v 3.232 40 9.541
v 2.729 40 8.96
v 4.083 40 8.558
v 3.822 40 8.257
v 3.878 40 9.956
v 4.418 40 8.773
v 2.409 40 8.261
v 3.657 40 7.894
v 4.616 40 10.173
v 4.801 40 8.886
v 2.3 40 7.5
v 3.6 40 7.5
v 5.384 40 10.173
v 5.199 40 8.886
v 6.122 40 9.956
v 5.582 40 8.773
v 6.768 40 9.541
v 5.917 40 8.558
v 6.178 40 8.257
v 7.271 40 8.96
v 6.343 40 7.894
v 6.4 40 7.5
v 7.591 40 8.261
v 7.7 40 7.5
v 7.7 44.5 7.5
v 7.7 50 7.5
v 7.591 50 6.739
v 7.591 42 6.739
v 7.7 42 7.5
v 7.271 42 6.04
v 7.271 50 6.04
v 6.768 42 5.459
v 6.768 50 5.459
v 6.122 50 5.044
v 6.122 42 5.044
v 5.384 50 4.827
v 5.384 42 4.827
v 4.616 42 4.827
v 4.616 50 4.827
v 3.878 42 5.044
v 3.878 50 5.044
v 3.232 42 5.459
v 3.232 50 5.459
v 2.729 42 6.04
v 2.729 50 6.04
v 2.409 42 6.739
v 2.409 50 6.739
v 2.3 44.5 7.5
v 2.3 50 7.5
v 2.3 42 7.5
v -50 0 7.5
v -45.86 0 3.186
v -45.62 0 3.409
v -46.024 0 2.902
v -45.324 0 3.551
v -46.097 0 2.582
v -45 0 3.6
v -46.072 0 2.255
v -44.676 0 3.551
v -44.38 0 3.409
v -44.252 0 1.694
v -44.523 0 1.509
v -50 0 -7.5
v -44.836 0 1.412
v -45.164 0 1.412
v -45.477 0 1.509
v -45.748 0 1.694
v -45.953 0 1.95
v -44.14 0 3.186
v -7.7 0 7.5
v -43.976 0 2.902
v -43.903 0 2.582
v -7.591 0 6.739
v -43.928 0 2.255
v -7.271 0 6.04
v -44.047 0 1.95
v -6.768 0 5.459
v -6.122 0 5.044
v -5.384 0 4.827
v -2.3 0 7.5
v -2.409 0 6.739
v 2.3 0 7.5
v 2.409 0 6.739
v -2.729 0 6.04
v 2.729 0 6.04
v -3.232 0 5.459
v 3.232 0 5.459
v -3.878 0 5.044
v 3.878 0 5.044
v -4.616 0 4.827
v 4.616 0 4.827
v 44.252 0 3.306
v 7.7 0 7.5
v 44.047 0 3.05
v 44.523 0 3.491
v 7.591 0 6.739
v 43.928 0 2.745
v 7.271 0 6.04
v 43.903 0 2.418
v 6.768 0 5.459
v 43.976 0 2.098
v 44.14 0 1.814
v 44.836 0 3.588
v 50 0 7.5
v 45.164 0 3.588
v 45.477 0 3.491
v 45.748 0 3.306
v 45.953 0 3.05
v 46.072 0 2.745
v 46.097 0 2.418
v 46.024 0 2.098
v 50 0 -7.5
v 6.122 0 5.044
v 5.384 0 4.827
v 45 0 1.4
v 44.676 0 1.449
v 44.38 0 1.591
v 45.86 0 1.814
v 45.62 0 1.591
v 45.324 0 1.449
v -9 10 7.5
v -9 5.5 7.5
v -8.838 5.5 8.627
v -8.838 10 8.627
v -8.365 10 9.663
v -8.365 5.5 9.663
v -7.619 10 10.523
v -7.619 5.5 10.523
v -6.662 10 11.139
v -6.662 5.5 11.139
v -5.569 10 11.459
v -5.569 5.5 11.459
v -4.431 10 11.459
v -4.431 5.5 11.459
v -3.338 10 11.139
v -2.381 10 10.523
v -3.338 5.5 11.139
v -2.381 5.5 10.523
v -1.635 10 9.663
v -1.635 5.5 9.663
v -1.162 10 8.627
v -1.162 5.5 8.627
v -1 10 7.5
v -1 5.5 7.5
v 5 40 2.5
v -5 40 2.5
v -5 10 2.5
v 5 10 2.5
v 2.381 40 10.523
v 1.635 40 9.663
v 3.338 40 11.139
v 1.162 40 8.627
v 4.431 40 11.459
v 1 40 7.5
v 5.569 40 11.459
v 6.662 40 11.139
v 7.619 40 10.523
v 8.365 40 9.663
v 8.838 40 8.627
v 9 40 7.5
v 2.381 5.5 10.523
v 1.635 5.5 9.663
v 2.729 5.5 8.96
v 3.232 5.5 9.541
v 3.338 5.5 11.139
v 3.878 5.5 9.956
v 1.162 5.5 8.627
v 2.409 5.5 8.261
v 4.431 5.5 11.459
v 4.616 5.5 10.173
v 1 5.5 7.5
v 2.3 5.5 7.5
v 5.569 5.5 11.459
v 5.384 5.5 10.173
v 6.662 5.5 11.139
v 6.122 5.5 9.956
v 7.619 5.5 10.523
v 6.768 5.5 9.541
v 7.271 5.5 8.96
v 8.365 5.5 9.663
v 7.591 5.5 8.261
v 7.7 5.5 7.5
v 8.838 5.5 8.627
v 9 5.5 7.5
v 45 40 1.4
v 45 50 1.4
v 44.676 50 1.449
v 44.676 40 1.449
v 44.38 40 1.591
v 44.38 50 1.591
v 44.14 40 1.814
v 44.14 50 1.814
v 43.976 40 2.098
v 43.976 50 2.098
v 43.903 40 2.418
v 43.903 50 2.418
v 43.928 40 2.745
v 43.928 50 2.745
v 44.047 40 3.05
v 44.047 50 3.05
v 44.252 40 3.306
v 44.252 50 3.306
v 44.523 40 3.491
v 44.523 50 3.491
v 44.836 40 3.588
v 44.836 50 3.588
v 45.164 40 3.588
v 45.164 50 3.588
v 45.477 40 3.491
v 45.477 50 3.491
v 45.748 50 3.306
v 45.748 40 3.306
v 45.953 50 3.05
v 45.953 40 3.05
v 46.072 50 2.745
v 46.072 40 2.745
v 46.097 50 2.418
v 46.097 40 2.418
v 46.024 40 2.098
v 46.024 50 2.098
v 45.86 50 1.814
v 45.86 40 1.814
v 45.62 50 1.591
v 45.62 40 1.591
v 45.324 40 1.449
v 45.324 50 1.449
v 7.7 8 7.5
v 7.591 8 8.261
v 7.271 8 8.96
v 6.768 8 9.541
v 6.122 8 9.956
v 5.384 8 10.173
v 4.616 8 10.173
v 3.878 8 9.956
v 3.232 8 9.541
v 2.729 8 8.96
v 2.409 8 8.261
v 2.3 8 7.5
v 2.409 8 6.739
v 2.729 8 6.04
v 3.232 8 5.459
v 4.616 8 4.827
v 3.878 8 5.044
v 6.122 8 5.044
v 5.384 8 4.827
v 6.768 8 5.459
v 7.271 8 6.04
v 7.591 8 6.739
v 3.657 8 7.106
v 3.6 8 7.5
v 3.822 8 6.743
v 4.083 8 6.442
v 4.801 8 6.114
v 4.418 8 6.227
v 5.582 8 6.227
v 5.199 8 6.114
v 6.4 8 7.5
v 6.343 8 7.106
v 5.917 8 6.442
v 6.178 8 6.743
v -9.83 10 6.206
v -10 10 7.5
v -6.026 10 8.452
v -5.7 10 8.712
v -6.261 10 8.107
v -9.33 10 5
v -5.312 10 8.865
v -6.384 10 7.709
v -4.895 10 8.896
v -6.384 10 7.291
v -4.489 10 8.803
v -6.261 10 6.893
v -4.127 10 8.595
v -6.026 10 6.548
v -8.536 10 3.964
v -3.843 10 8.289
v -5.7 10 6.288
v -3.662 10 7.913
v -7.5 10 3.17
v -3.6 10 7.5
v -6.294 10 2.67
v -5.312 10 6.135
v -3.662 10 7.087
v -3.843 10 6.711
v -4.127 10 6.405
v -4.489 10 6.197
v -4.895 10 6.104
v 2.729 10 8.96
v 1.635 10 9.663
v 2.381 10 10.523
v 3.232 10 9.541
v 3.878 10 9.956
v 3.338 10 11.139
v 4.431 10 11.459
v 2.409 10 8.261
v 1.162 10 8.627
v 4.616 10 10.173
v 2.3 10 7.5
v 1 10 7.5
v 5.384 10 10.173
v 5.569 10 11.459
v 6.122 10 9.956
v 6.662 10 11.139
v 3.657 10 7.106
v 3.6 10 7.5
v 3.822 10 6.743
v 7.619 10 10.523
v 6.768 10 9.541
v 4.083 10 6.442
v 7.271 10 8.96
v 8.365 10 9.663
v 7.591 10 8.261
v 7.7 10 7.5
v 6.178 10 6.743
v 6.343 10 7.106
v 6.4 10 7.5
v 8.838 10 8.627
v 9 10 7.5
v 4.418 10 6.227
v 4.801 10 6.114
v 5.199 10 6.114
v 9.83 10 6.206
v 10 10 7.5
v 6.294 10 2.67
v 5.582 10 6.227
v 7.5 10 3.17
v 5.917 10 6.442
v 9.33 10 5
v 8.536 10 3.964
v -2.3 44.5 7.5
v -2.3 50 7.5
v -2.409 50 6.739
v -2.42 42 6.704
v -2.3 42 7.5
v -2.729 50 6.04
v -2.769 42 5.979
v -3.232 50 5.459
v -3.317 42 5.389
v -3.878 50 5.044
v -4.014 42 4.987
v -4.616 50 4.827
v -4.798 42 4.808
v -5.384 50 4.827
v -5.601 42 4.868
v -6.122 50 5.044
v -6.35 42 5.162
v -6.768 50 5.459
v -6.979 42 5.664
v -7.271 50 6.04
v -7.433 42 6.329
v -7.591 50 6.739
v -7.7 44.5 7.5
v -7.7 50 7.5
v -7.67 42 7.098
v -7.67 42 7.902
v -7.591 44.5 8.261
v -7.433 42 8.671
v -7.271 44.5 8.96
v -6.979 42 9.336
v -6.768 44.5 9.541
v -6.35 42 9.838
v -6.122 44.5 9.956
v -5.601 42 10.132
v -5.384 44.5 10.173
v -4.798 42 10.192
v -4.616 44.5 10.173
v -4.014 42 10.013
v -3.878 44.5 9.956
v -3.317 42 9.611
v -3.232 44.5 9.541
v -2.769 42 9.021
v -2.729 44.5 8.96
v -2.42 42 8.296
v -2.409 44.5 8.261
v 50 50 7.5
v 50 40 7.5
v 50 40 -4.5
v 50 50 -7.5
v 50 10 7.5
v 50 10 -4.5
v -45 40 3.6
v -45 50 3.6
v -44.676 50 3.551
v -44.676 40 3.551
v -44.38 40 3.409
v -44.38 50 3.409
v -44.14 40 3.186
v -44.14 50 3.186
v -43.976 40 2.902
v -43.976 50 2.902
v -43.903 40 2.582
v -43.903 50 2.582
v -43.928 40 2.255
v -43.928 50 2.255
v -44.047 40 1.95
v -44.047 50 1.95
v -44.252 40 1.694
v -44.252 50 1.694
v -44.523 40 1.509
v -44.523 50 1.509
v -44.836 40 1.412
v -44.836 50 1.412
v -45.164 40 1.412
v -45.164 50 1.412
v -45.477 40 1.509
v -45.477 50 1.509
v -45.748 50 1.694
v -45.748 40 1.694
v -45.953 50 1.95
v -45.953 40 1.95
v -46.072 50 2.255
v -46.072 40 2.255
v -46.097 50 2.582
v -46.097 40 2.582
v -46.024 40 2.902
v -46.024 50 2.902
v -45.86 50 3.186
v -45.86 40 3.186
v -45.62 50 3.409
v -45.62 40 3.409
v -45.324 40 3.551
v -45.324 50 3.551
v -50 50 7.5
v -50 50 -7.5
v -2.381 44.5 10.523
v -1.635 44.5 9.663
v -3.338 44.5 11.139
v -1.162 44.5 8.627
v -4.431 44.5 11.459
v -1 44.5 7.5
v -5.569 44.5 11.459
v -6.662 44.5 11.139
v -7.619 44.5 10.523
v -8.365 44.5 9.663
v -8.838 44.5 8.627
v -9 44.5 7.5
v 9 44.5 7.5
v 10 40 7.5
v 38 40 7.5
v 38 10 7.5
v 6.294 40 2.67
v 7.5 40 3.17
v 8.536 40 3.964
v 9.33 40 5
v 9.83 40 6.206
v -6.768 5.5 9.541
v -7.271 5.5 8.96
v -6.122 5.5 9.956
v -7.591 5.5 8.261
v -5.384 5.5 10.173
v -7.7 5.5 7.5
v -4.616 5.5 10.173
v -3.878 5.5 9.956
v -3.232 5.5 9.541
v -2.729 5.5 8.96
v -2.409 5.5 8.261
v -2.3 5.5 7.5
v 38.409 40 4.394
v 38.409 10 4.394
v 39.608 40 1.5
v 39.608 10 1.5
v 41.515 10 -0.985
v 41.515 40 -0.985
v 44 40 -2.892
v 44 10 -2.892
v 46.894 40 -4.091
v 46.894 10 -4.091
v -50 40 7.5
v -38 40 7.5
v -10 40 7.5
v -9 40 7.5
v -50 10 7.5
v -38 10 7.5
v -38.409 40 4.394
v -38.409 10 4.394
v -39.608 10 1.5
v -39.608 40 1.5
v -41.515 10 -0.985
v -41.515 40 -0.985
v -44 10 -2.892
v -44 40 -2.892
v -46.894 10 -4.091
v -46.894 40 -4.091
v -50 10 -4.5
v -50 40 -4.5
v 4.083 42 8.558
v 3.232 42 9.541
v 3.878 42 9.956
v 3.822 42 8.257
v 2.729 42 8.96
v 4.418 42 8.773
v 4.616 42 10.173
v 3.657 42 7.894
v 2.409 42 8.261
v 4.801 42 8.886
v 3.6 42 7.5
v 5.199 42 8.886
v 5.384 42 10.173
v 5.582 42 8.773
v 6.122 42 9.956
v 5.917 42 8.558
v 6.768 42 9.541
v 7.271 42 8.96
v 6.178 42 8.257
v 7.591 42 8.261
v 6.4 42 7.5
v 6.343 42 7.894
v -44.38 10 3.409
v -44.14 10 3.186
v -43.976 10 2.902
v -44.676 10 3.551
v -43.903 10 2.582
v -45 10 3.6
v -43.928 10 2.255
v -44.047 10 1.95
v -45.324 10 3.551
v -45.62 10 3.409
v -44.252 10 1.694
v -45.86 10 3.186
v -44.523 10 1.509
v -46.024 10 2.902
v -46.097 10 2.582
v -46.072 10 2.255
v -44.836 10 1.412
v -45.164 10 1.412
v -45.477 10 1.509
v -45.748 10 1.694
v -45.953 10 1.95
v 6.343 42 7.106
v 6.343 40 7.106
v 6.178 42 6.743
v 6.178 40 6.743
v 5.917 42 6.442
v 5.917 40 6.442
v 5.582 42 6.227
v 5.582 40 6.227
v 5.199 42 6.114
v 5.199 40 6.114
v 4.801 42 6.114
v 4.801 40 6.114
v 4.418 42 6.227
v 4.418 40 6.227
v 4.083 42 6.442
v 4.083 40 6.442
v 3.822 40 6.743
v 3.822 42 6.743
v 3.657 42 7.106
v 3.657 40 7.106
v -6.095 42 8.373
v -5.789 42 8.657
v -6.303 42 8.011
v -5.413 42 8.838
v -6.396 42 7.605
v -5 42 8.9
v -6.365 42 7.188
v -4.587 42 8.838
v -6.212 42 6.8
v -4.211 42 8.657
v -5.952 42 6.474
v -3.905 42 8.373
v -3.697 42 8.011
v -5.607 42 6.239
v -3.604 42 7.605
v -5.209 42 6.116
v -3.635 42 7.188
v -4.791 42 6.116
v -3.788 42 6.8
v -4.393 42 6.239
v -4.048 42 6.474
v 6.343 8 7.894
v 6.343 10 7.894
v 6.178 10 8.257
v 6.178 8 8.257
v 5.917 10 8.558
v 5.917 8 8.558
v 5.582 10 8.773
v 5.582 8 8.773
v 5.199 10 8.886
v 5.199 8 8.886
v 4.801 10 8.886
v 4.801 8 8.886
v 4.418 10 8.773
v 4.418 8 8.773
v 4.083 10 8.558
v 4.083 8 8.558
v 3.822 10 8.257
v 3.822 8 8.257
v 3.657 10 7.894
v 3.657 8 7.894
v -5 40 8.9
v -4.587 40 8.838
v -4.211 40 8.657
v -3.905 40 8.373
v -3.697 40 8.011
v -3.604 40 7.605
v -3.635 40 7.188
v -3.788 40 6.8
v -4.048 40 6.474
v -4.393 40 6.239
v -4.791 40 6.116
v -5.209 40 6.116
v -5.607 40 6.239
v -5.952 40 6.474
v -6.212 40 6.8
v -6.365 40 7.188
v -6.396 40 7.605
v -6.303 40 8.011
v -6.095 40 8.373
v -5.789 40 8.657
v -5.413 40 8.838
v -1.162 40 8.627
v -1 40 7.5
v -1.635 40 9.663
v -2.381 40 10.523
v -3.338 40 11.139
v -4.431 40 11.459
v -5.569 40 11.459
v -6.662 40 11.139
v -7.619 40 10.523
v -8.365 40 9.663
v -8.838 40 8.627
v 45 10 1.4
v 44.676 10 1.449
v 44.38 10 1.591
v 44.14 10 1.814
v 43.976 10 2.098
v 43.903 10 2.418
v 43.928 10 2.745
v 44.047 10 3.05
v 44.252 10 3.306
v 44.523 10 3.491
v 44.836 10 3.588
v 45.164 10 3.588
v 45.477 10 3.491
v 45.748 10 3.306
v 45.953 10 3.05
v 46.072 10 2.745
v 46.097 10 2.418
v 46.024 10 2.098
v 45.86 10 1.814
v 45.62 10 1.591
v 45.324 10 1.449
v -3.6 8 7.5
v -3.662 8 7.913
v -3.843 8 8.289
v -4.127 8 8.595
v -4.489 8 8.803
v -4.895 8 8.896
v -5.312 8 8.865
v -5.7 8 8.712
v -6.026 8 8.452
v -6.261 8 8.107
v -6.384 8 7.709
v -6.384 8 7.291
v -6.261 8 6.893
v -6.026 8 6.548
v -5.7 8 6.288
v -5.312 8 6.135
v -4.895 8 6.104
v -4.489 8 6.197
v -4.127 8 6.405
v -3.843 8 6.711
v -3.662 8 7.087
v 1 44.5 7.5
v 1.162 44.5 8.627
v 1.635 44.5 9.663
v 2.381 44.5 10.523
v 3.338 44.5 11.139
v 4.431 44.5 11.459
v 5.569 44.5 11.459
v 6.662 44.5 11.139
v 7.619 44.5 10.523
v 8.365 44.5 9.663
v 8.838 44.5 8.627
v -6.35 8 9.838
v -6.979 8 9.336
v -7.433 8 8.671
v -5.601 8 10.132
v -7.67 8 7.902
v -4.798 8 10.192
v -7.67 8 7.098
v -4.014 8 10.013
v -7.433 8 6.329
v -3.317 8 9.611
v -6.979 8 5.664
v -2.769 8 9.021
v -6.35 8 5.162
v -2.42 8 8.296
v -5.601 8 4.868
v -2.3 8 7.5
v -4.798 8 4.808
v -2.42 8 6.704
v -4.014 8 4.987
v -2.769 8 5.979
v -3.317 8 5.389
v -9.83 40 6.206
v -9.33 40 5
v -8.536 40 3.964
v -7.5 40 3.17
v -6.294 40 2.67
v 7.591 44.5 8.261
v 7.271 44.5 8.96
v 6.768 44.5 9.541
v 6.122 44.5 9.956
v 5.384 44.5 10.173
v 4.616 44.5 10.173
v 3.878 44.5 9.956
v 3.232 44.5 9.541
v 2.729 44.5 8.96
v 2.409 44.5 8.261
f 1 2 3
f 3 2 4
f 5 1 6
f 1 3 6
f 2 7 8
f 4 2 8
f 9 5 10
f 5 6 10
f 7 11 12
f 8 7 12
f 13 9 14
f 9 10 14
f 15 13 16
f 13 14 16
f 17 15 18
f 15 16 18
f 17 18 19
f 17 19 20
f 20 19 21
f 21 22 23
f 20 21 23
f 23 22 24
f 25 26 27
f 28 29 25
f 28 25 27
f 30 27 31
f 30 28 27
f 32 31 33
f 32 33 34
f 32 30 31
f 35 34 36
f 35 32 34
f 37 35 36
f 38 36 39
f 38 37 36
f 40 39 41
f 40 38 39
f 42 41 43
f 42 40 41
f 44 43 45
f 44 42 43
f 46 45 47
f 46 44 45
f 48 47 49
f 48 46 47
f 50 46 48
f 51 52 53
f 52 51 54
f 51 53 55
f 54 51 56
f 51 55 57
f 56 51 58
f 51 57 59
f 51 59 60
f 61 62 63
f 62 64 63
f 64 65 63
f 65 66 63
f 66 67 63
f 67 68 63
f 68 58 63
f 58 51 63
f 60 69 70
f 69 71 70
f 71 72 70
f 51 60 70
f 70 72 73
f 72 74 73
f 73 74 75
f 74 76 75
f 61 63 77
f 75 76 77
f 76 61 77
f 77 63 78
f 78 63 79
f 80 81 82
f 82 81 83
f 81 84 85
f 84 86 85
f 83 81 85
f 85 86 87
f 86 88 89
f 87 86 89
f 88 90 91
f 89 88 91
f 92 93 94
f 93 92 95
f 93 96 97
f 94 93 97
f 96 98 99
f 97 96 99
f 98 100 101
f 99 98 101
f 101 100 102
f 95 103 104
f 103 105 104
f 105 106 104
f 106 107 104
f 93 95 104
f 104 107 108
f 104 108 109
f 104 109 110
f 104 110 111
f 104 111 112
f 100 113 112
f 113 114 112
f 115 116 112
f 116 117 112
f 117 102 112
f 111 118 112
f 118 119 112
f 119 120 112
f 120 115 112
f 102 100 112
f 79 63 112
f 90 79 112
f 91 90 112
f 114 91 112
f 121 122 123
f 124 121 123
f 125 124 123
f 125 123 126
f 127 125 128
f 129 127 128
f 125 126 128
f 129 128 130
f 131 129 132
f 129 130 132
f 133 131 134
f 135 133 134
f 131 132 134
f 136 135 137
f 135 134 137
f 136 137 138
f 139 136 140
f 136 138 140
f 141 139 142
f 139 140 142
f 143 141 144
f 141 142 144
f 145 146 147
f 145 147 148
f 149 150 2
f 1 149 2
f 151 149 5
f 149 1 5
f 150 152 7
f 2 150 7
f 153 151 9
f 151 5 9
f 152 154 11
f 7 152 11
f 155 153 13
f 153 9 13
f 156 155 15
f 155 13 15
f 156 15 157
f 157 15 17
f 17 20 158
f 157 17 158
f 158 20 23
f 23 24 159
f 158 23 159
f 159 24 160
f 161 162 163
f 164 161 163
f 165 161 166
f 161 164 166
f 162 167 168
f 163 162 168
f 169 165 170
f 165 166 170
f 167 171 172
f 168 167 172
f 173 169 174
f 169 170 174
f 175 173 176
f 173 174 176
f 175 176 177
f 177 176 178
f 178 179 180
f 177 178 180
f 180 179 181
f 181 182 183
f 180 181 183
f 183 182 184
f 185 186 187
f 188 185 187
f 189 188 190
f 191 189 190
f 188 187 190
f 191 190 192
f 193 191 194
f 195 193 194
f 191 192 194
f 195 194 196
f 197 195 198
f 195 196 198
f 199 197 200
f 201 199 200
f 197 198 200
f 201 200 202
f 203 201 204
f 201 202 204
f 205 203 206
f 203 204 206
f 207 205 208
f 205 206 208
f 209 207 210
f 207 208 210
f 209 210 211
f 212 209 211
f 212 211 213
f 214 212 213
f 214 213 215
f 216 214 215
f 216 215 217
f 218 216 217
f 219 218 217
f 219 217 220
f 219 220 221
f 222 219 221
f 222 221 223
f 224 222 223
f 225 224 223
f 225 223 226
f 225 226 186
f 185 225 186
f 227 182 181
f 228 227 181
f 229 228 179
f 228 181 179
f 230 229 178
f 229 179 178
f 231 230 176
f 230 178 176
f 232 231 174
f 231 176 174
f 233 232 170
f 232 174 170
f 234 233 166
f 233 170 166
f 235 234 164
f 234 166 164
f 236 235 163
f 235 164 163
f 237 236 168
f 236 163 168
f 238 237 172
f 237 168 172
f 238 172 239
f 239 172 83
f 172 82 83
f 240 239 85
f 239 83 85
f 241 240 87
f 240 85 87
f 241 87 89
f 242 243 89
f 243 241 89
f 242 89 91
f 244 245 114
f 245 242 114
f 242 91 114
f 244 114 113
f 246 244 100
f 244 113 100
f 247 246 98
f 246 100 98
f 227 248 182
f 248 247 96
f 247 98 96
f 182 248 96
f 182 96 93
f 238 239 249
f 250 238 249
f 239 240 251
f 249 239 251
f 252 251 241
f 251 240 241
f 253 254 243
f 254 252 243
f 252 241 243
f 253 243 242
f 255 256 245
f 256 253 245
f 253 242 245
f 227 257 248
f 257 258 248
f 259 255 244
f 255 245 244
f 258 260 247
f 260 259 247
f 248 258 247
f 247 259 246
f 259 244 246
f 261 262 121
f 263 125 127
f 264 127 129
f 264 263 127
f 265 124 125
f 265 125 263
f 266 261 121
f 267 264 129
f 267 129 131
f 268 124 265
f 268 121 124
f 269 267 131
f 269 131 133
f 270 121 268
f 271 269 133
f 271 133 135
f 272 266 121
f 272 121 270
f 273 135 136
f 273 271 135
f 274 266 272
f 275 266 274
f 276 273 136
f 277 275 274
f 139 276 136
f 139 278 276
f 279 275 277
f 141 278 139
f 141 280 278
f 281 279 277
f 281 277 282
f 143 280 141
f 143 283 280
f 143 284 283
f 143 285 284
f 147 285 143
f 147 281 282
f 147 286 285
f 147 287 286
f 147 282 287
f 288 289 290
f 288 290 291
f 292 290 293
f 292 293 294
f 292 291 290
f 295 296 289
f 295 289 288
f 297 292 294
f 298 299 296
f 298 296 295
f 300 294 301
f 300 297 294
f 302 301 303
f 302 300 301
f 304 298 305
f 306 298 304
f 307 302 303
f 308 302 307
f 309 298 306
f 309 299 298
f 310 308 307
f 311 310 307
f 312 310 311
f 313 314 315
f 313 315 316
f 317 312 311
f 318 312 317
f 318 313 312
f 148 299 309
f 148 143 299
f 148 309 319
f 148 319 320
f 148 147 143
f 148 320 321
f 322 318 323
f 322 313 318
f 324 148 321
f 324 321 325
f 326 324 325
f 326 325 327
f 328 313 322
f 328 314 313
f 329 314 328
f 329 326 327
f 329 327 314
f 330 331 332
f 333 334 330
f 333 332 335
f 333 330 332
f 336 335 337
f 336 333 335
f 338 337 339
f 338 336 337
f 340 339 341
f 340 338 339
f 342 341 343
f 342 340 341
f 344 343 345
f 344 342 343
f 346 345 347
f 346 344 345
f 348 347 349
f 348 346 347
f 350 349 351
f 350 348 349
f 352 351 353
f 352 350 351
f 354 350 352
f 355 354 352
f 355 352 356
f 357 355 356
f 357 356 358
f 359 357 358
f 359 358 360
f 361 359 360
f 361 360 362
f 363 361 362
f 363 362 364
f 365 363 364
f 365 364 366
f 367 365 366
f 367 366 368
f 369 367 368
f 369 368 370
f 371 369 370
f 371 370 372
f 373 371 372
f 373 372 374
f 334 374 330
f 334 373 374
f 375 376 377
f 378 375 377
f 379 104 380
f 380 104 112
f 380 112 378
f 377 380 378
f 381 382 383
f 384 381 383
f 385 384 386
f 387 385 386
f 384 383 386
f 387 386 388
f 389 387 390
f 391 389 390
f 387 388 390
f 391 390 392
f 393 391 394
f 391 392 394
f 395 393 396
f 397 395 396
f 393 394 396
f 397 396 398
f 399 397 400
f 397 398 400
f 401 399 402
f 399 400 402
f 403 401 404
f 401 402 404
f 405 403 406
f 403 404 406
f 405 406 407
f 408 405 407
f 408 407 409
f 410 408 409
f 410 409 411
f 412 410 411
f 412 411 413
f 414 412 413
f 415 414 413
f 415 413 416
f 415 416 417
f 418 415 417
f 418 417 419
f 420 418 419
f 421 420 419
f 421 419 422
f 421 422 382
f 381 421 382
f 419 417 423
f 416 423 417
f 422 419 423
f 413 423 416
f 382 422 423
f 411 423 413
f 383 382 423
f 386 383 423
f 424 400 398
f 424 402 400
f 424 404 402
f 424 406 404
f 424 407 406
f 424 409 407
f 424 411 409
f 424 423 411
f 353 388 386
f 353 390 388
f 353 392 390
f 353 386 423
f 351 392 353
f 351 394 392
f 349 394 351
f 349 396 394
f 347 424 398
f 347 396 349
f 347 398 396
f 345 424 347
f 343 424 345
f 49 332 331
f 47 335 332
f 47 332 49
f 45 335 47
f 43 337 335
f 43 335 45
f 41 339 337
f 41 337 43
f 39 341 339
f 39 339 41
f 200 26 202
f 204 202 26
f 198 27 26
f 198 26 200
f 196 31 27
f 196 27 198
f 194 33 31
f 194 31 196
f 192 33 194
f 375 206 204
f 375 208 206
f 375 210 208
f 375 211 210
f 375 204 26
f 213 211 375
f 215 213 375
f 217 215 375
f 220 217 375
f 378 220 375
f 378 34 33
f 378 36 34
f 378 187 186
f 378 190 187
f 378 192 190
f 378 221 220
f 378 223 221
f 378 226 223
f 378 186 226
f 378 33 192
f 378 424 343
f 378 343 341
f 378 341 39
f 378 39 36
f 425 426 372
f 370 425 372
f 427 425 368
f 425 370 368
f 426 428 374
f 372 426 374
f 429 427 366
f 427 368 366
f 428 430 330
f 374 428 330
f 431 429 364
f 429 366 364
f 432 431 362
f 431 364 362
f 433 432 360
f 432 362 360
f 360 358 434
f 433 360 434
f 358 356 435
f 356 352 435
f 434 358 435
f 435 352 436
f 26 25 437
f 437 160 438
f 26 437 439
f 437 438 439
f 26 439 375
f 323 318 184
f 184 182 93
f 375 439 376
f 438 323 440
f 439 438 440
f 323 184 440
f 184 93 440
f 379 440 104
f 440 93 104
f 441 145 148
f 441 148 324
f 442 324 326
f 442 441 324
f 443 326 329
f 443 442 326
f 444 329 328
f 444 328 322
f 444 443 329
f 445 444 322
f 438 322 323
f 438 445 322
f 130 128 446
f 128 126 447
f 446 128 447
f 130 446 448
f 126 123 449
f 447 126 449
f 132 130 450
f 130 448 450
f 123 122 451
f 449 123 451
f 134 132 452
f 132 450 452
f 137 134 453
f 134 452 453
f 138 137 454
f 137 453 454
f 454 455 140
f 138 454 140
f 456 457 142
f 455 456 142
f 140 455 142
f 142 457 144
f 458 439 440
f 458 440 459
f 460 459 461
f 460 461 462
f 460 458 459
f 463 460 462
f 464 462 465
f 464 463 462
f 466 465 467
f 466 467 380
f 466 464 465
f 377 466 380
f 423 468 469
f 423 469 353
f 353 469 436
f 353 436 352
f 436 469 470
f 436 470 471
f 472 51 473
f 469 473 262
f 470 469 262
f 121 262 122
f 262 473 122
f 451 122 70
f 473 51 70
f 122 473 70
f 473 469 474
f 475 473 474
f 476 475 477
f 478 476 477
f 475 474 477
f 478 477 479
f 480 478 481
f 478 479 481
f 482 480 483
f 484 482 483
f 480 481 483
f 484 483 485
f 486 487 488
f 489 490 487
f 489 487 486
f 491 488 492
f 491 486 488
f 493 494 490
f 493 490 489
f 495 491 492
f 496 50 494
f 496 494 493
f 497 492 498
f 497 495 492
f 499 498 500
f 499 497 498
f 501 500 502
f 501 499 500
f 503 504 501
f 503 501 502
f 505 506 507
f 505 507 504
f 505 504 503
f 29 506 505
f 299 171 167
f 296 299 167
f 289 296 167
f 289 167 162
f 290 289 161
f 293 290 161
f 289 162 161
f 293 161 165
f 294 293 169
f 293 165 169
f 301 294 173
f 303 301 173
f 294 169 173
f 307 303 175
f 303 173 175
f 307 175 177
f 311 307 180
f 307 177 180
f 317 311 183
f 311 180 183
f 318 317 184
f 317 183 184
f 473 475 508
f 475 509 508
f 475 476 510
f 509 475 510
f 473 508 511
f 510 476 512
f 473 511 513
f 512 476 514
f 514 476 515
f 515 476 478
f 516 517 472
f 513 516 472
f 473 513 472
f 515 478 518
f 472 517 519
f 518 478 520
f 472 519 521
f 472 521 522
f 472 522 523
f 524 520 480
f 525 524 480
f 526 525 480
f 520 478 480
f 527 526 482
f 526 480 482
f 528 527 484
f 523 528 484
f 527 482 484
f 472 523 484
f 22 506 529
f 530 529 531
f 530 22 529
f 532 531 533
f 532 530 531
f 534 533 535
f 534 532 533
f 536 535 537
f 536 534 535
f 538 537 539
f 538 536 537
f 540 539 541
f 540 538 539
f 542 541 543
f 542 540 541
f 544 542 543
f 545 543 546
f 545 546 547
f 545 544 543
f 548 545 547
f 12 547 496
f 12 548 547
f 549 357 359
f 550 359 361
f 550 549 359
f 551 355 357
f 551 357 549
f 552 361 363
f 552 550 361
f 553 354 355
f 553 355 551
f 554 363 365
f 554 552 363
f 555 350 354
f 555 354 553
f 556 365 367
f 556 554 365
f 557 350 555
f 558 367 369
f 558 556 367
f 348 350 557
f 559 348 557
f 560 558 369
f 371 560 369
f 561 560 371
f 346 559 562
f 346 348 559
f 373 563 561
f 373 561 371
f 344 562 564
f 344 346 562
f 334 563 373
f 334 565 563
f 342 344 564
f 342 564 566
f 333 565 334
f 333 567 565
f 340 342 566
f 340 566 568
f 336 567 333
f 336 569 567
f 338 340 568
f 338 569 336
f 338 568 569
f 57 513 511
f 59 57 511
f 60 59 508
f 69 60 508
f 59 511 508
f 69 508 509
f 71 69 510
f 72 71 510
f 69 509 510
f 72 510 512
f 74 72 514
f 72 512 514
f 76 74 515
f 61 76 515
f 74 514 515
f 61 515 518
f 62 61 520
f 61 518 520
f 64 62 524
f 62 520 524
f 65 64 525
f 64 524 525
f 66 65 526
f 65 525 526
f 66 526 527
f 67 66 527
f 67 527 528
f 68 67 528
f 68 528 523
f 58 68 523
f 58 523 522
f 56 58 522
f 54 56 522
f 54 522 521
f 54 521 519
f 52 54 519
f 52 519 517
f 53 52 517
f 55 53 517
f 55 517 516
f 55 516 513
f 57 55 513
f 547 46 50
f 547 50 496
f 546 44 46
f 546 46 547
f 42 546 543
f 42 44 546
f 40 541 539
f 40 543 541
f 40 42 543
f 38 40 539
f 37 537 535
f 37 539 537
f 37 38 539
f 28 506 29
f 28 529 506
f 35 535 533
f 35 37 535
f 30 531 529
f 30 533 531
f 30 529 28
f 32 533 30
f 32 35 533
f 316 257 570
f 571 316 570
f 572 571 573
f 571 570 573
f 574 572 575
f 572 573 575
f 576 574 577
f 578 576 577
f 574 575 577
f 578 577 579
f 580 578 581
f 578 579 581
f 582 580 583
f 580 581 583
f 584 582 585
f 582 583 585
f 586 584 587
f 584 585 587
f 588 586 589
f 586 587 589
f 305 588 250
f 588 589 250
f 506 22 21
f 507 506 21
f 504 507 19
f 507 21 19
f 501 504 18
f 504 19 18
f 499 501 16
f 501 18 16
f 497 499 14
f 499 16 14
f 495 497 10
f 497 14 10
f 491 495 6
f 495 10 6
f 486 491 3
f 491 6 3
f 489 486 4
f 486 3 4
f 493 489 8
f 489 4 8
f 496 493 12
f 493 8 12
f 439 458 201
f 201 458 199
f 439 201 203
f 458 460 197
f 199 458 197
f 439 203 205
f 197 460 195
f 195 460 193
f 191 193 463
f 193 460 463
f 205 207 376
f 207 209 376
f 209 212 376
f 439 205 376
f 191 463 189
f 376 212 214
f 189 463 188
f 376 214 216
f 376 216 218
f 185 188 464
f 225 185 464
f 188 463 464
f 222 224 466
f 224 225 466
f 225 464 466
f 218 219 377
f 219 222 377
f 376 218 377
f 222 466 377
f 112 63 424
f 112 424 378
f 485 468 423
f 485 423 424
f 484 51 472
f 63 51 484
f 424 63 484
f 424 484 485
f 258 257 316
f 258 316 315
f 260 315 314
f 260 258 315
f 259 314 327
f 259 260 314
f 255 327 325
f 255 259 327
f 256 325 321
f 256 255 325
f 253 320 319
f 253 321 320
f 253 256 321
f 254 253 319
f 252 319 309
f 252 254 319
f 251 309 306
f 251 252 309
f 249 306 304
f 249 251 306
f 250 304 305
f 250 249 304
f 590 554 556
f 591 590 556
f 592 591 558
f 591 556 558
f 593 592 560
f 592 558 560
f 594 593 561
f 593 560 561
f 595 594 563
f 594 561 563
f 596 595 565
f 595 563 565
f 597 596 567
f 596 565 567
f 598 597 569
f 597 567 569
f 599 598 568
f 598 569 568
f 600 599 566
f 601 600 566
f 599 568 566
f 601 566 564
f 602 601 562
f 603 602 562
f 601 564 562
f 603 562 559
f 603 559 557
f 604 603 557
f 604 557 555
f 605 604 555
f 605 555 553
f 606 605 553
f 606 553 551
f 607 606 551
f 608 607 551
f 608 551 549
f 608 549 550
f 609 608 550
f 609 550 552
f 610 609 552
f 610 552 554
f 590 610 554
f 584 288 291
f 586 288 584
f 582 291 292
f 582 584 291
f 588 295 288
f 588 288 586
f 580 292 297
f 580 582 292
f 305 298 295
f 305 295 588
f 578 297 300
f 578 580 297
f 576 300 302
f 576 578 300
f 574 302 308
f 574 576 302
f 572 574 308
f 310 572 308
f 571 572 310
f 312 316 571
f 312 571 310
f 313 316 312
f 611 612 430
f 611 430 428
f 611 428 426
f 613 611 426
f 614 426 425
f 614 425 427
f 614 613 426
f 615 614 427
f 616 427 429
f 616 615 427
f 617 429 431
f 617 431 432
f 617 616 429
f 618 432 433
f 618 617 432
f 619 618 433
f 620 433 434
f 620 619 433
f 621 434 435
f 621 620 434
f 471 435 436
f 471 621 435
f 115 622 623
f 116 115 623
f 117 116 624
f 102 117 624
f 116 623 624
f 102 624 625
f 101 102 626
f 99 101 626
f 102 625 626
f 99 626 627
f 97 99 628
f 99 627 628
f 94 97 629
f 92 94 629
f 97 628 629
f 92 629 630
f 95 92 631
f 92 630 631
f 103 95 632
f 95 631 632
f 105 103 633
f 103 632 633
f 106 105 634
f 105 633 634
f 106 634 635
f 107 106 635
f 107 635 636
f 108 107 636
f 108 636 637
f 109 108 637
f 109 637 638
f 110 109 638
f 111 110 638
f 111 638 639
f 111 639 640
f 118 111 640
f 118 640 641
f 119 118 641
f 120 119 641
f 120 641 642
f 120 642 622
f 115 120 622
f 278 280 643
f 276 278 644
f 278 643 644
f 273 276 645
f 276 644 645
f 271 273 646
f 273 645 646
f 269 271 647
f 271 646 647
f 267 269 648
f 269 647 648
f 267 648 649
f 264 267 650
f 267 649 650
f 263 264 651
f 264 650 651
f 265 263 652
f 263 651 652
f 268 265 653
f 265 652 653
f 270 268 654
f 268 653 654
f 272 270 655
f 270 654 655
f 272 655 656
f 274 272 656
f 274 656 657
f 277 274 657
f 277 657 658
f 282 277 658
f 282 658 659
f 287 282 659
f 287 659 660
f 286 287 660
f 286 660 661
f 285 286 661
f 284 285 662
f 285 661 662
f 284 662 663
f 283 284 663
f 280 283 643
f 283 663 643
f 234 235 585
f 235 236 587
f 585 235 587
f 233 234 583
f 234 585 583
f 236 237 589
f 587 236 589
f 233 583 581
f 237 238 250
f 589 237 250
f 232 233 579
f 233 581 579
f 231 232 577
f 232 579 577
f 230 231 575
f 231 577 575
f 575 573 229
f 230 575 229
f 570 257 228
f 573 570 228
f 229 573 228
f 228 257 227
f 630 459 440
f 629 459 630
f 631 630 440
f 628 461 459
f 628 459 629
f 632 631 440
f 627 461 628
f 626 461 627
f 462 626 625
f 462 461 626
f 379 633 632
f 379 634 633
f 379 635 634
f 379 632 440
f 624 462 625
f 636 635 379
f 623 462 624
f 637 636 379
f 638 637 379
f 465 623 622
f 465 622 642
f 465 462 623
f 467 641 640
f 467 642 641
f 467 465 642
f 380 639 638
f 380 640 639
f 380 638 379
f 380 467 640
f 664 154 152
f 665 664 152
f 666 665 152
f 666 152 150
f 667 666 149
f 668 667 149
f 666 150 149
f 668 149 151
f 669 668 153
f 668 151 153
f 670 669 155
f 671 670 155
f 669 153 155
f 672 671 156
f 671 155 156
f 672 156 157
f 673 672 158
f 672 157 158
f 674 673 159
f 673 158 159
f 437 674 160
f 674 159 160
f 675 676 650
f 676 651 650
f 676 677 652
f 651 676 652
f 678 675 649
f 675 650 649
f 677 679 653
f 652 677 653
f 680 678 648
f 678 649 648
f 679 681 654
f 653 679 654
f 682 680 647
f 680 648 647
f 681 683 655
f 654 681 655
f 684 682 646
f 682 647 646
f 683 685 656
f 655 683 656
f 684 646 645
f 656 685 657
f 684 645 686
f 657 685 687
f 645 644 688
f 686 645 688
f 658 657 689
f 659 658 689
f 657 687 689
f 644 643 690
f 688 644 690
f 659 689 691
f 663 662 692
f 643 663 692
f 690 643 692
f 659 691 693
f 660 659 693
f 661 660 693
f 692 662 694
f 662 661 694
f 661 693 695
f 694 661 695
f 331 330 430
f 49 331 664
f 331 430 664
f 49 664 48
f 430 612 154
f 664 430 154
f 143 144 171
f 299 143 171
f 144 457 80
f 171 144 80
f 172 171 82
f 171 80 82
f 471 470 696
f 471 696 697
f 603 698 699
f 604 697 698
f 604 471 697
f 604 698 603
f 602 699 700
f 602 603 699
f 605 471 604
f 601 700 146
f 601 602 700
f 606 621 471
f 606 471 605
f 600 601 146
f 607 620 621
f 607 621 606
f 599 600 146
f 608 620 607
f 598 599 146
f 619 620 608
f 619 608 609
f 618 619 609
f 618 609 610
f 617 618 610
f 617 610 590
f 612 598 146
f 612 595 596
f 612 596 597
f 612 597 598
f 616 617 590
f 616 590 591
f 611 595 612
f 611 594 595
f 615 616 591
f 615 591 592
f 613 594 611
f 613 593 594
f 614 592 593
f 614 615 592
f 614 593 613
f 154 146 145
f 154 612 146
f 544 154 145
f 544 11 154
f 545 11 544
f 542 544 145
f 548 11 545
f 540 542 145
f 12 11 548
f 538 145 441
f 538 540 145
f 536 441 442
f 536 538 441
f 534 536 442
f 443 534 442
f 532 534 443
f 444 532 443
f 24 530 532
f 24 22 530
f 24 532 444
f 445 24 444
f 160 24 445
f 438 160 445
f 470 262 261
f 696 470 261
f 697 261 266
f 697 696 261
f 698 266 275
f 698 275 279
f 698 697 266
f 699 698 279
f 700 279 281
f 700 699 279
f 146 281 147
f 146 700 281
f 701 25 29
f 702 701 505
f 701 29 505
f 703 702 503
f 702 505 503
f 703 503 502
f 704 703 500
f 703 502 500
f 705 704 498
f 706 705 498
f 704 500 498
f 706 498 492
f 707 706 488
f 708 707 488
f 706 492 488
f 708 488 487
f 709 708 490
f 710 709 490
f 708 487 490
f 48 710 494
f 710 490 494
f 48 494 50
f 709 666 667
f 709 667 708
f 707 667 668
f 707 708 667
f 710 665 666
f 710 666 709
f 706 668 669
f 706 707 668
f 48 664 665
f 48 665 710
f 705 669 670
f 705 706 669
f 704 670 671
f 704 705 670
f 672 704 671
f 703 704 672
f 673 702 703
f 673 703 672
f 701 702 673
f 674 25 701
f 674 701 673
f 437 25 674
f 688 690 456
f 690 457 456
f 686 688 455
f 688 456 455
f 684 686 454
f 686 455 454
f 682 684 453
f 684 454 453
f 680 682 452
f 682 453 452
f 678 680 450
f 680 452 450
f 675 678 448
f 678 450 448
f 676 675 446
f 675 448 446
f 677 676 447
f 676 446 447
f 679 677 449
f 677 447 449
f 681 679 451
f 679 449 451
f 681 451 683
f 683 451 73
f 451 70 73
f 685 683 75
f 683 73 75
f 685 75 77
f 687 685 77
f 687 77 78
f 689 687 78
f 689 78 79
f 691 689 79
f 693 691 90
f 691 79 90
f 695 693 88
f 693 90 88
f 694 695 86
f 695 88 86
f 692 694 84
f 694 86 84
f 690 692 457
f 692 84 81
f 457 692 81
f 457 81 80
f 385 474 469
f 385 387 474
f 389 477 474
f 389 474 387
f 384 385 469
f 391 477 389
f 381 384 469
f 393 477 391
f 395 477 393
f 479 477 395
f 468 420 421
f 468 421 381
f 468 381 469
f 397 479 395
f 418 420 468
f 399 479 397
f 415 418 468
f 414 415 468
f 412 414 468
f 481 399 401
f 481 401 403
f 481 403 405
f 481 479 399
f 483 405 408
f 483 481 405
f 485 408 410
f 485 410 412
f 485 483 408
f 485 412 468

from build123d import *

# Parameters (mm, degrees)
SKETCH_1_W               = 100
SKETCH_1_H               = 15
EXTRUDE_1_DEPTH          = 50
SKETCH_2_R               = 1.1
CUT_EXTRUDE_1_DEPTH      = 72.107313267
SKETCH_3_W               = 12
SKETCH_3_H               = 30
CUT_EXTRUDE_5_DEPTH      = 15
CUT_EXTRUDE_5_DEPTH_BACK = 15
EXTRUDE_2_DEPTH          = 4.5
CUT_EXTRUDE_START        = -2.5
SKETCH_5_R               = 2.7
CUT_EXTRUDE_2_DEPTH      = 12.5
SKETCH_6_R               = 1.4
CUT_EXTRUDE_4_DEPTH      = 67.304223093
MIRROR_4_COPY_1_DEPTH    = 4.5
MIRROR_START             = -2.5
MIRROR_4_COPY_2_SKETCH_R = 2.7
MIRROR_4_COPY_2_DEPTH    = 12.5
MIRROR_4_COPY_3_SKETCH_R = 1.4
MIRROR_4_COPY_3_DEPTH    = 67.304223093
MIRROR_4_COPY_4_DEPTH    = 4.5
MIRROR_4_COPY_5_SKETCH_R = 2.7
MIRROR_4_COPY_5_DEPTH    = 12.5
MIRROR_4_COPY_6_SKETCH_R = 1.4
MIRROR_4_COPY_6_DEPTH    = 67.304223093


with BuildPart() as part:
    # 草图1 → 凸台-拉伸1 (new body)
    with BuildSketch(Plane(origin=(0, 0, 0), x_dir=(1, 0, 0), z_dir=(0, 1, 0))):
        Rectangle(SKETCH_1_W, SKETCH_1_H)
    extrude(amount=EXTRUDE_1_DEPTH)

    # 草图2 → 切除-拉伸1 (cut, through all)
    with BuildSketch(Plane(origin=(0, 50, 0), x_dir=(1, 0, 0), z_dir=(0, 1, 0))):
        with Locations((-45, -2.5)):
            Circle(SKETCH_2_R)
        with Locations((45, -2.5)):
            Circle(SKETCH_2_R)
    extrude(amount=-CUT_EXTRUDE_1_DEPTH, mode=Mode.SUBTRACT)

    # 草图3 → 切除-旋转1 (revolve, cut)
    with BuildSketch(Plane.XY.offset(7.5)):
        with Locations((-44, 25)):
            Rectangle(SKETCH_3_W, SKETCH_3_H)
    cut_revolve_1 = revolve(axis=Axis((-50, 10, 7.5), (0, 1, 0)), mode=Mode.SUBTRACT)

    # 镜向1: 切除-旋转1 across plane
    add(cut_revolve_1.mirror(Plane.ZY), mode=Mode.SUBTRACT)

    # 草图10 → 切除-拉伸5 (cut, two sides: drawn at the far end of the back side and taken through both)
    with BuildSketch(Plane.XZ.offset(-25).offset(-CUT_EXTRUDE_5_DEPTH_BACK)):
        with BuildLine():
            Line((-5, 2.5), (5, 2.5))
            ThreePointArc((5, 2.5), (8.535533906, 3.964466094), (10, 7.5))
            Line((10, 7.5), (-10, 7.5))
            ThreePointArc((-10, 7.5), (-8.535533906, 3.964466094), (-5, 2.5))
        make_face()
    extrude(amount=CUT_EXTRUDE_5_DEPTH + CUT_EXTRUDE_5_DEPTH_BACK, mode=Mode.SUBTRACT)

    # 草图7 → 凸台-拉伸2 (add)
    with BuildSketch(Plane(origin=(0, 40, 0), x_dir=(1, 0, 0), z_dir=(0, 1, 0))):
        with BuildLine():
            Line((-9, -7.5), (-1, -7.5))
            ThreePointArc((-1, -7.5), (-5, -11.5), (-9, -7.5))
        make_face()
    extrude_2 = extrude(amount=EXTRUDE_2_DEPTH)

    # 草图5 → 切除-拉伸2 (cut)
    with BuildSketch(Plane(origin=(0, 44.5, 0), x_dir=(1, 0, 0), z_dir=(0, 1, 0)).offset(CUT_EXTRUDE_START)):
        with Locations((-5, -7.5)):
            Circle(SKETCH_5_R)
    cut_extrude_2 = extrude(amount=CUT_EXTRUDE_2_DEPTH, mode=Mode.SUBTRACT)

    # 草图6 → 切除-拉伸4 (cut, through all)
    with BuildSketch(Plane(origin=(0, 42, 0), x_dir=(1, 0, 0), z_dir=(0, 1, 0))):
        with Locations((-5, -7.5)):
            Circle(SKETCH_6_R)
    cut_extrude_4 = extrude(amount=-CUT_EXTRUDE_4_DEPTH, mode=Mode.SUBTRACT)

    # 镜向2: 凸台-拉伸2, 切除-拉伸2, 切除-拉伸4 across plane
    add(extrude_2.mirror(Plane(origin=(0, 25, 0), x_dir=(0, 0, 1), z_dir=(0, -1, 0))))
    add(cut_extrude_2.mirror(Plane(origin=(0, 25, 0), x_dir=(0, 0, 1), z_dir=(0, -1, 0))), mode=Mode.SUBTRACT)
    add(cut_extrude_4.mirror(Plane(origin=(0, 25, 0), x_dir=(0, 0, 1), z_dir=(0, -1, 0))), mode=Mode.SUBTRACT)

    # 镜向4 copy 1 sketch → 镜向4 copy 1 (add)
    with BuildSketch(Plane(origin=(0, 10, 0), x_dir=(-1, 0, 0), z_dir=(0, -1, 0))):
        with BuildLine():
            Line((-9, -7.5), (-1, -7.5))
            ThreePointArc((-1, -7.5), (-5, -11.5), (-9, -7.5))
        make_face()
    extrude(amount=MIRROR_4_COPY_1_DEPTH)

    # 镜向4 copy 2 sketch → 镜向4 copy 2 (cut)
    with BuildSketch(Plane(origin=(0, 5.5, 0), x_dir=(-1, 0, 0), z_dir=(0, -1, 0)).offset(MIRROR_START)):
        with Locations((-5, -7.5)):
            Circle(MIRROR_4_COPY_2_SKETCH_R)
    extrude(amount=MIRROR_4_COPY_2_DEPTH, mode=Mode.SUBTRACT)

    # 镜向4 copy 3 sketch → 镜向4 copy 3 (cut, through all)
    with BuildSketch(Plane(origin=(0, 8, 0), x_dir=(-1, 0, 0), z_dir=(0, -1, 0))):
        with Locations((-5, -7.5)):
            Circle(MIRROR_4_COPY_3_SKETCH_R)
    extrude(amount=-MIRROR_4_COPY_3_DEPTH, mode=Mode.SUBTRACT)

    # 镜向4 copy 4 sketch → 镜向4 copy 4 (add)
    with BuildSketch(Plane(origin=(0, 40, 0), x_dir=(-1, 0, 0), z_dir=(0, 1, 0))):
        with BuildLine():
            Line((-9, 7.5), (-1, 7.5))
            ThreePointArc((-1, 7.5), (-5, 11.5), (-9, 7.5))
        make_face()
    extrude(amount=MIRROR_4_COPY_4_DEPTH)

    # 镜向4 copy 5 sketch → 镜向4 copy 5 (cut)
    with BuildSketch(Plane(origin=(0, 44.5, 0), x_dir=(-1, 0, 0), z_dir=(0, 1, 0)).offset(MIRROR_START)):
        with Locations((-5, 7.5)):
            Circle(MIRROR_4_COPY_5_SKETCH_R)
    extrude(amount=MIRROR_4_COPY_5_DEPTH, mode=Mode.SUBTRACT)

    # 镜向4 copy 6 sketch → 镜向4 copy 6 (cut, through all)
    with BuildSketch(Plane(origin=(0, 42, 0), x_dir=(-1, 0, 0), z_dir=(0, 1, 0))):
        with Locations((-5, 7.5)):
            Circle(MIRROR_4_COPY_6_SKETCH_R)
    extrude(amount=-MIRROR_4_COPY_6_DEPTH, mode=Mode.SUBTRACT)


solid = part.part
